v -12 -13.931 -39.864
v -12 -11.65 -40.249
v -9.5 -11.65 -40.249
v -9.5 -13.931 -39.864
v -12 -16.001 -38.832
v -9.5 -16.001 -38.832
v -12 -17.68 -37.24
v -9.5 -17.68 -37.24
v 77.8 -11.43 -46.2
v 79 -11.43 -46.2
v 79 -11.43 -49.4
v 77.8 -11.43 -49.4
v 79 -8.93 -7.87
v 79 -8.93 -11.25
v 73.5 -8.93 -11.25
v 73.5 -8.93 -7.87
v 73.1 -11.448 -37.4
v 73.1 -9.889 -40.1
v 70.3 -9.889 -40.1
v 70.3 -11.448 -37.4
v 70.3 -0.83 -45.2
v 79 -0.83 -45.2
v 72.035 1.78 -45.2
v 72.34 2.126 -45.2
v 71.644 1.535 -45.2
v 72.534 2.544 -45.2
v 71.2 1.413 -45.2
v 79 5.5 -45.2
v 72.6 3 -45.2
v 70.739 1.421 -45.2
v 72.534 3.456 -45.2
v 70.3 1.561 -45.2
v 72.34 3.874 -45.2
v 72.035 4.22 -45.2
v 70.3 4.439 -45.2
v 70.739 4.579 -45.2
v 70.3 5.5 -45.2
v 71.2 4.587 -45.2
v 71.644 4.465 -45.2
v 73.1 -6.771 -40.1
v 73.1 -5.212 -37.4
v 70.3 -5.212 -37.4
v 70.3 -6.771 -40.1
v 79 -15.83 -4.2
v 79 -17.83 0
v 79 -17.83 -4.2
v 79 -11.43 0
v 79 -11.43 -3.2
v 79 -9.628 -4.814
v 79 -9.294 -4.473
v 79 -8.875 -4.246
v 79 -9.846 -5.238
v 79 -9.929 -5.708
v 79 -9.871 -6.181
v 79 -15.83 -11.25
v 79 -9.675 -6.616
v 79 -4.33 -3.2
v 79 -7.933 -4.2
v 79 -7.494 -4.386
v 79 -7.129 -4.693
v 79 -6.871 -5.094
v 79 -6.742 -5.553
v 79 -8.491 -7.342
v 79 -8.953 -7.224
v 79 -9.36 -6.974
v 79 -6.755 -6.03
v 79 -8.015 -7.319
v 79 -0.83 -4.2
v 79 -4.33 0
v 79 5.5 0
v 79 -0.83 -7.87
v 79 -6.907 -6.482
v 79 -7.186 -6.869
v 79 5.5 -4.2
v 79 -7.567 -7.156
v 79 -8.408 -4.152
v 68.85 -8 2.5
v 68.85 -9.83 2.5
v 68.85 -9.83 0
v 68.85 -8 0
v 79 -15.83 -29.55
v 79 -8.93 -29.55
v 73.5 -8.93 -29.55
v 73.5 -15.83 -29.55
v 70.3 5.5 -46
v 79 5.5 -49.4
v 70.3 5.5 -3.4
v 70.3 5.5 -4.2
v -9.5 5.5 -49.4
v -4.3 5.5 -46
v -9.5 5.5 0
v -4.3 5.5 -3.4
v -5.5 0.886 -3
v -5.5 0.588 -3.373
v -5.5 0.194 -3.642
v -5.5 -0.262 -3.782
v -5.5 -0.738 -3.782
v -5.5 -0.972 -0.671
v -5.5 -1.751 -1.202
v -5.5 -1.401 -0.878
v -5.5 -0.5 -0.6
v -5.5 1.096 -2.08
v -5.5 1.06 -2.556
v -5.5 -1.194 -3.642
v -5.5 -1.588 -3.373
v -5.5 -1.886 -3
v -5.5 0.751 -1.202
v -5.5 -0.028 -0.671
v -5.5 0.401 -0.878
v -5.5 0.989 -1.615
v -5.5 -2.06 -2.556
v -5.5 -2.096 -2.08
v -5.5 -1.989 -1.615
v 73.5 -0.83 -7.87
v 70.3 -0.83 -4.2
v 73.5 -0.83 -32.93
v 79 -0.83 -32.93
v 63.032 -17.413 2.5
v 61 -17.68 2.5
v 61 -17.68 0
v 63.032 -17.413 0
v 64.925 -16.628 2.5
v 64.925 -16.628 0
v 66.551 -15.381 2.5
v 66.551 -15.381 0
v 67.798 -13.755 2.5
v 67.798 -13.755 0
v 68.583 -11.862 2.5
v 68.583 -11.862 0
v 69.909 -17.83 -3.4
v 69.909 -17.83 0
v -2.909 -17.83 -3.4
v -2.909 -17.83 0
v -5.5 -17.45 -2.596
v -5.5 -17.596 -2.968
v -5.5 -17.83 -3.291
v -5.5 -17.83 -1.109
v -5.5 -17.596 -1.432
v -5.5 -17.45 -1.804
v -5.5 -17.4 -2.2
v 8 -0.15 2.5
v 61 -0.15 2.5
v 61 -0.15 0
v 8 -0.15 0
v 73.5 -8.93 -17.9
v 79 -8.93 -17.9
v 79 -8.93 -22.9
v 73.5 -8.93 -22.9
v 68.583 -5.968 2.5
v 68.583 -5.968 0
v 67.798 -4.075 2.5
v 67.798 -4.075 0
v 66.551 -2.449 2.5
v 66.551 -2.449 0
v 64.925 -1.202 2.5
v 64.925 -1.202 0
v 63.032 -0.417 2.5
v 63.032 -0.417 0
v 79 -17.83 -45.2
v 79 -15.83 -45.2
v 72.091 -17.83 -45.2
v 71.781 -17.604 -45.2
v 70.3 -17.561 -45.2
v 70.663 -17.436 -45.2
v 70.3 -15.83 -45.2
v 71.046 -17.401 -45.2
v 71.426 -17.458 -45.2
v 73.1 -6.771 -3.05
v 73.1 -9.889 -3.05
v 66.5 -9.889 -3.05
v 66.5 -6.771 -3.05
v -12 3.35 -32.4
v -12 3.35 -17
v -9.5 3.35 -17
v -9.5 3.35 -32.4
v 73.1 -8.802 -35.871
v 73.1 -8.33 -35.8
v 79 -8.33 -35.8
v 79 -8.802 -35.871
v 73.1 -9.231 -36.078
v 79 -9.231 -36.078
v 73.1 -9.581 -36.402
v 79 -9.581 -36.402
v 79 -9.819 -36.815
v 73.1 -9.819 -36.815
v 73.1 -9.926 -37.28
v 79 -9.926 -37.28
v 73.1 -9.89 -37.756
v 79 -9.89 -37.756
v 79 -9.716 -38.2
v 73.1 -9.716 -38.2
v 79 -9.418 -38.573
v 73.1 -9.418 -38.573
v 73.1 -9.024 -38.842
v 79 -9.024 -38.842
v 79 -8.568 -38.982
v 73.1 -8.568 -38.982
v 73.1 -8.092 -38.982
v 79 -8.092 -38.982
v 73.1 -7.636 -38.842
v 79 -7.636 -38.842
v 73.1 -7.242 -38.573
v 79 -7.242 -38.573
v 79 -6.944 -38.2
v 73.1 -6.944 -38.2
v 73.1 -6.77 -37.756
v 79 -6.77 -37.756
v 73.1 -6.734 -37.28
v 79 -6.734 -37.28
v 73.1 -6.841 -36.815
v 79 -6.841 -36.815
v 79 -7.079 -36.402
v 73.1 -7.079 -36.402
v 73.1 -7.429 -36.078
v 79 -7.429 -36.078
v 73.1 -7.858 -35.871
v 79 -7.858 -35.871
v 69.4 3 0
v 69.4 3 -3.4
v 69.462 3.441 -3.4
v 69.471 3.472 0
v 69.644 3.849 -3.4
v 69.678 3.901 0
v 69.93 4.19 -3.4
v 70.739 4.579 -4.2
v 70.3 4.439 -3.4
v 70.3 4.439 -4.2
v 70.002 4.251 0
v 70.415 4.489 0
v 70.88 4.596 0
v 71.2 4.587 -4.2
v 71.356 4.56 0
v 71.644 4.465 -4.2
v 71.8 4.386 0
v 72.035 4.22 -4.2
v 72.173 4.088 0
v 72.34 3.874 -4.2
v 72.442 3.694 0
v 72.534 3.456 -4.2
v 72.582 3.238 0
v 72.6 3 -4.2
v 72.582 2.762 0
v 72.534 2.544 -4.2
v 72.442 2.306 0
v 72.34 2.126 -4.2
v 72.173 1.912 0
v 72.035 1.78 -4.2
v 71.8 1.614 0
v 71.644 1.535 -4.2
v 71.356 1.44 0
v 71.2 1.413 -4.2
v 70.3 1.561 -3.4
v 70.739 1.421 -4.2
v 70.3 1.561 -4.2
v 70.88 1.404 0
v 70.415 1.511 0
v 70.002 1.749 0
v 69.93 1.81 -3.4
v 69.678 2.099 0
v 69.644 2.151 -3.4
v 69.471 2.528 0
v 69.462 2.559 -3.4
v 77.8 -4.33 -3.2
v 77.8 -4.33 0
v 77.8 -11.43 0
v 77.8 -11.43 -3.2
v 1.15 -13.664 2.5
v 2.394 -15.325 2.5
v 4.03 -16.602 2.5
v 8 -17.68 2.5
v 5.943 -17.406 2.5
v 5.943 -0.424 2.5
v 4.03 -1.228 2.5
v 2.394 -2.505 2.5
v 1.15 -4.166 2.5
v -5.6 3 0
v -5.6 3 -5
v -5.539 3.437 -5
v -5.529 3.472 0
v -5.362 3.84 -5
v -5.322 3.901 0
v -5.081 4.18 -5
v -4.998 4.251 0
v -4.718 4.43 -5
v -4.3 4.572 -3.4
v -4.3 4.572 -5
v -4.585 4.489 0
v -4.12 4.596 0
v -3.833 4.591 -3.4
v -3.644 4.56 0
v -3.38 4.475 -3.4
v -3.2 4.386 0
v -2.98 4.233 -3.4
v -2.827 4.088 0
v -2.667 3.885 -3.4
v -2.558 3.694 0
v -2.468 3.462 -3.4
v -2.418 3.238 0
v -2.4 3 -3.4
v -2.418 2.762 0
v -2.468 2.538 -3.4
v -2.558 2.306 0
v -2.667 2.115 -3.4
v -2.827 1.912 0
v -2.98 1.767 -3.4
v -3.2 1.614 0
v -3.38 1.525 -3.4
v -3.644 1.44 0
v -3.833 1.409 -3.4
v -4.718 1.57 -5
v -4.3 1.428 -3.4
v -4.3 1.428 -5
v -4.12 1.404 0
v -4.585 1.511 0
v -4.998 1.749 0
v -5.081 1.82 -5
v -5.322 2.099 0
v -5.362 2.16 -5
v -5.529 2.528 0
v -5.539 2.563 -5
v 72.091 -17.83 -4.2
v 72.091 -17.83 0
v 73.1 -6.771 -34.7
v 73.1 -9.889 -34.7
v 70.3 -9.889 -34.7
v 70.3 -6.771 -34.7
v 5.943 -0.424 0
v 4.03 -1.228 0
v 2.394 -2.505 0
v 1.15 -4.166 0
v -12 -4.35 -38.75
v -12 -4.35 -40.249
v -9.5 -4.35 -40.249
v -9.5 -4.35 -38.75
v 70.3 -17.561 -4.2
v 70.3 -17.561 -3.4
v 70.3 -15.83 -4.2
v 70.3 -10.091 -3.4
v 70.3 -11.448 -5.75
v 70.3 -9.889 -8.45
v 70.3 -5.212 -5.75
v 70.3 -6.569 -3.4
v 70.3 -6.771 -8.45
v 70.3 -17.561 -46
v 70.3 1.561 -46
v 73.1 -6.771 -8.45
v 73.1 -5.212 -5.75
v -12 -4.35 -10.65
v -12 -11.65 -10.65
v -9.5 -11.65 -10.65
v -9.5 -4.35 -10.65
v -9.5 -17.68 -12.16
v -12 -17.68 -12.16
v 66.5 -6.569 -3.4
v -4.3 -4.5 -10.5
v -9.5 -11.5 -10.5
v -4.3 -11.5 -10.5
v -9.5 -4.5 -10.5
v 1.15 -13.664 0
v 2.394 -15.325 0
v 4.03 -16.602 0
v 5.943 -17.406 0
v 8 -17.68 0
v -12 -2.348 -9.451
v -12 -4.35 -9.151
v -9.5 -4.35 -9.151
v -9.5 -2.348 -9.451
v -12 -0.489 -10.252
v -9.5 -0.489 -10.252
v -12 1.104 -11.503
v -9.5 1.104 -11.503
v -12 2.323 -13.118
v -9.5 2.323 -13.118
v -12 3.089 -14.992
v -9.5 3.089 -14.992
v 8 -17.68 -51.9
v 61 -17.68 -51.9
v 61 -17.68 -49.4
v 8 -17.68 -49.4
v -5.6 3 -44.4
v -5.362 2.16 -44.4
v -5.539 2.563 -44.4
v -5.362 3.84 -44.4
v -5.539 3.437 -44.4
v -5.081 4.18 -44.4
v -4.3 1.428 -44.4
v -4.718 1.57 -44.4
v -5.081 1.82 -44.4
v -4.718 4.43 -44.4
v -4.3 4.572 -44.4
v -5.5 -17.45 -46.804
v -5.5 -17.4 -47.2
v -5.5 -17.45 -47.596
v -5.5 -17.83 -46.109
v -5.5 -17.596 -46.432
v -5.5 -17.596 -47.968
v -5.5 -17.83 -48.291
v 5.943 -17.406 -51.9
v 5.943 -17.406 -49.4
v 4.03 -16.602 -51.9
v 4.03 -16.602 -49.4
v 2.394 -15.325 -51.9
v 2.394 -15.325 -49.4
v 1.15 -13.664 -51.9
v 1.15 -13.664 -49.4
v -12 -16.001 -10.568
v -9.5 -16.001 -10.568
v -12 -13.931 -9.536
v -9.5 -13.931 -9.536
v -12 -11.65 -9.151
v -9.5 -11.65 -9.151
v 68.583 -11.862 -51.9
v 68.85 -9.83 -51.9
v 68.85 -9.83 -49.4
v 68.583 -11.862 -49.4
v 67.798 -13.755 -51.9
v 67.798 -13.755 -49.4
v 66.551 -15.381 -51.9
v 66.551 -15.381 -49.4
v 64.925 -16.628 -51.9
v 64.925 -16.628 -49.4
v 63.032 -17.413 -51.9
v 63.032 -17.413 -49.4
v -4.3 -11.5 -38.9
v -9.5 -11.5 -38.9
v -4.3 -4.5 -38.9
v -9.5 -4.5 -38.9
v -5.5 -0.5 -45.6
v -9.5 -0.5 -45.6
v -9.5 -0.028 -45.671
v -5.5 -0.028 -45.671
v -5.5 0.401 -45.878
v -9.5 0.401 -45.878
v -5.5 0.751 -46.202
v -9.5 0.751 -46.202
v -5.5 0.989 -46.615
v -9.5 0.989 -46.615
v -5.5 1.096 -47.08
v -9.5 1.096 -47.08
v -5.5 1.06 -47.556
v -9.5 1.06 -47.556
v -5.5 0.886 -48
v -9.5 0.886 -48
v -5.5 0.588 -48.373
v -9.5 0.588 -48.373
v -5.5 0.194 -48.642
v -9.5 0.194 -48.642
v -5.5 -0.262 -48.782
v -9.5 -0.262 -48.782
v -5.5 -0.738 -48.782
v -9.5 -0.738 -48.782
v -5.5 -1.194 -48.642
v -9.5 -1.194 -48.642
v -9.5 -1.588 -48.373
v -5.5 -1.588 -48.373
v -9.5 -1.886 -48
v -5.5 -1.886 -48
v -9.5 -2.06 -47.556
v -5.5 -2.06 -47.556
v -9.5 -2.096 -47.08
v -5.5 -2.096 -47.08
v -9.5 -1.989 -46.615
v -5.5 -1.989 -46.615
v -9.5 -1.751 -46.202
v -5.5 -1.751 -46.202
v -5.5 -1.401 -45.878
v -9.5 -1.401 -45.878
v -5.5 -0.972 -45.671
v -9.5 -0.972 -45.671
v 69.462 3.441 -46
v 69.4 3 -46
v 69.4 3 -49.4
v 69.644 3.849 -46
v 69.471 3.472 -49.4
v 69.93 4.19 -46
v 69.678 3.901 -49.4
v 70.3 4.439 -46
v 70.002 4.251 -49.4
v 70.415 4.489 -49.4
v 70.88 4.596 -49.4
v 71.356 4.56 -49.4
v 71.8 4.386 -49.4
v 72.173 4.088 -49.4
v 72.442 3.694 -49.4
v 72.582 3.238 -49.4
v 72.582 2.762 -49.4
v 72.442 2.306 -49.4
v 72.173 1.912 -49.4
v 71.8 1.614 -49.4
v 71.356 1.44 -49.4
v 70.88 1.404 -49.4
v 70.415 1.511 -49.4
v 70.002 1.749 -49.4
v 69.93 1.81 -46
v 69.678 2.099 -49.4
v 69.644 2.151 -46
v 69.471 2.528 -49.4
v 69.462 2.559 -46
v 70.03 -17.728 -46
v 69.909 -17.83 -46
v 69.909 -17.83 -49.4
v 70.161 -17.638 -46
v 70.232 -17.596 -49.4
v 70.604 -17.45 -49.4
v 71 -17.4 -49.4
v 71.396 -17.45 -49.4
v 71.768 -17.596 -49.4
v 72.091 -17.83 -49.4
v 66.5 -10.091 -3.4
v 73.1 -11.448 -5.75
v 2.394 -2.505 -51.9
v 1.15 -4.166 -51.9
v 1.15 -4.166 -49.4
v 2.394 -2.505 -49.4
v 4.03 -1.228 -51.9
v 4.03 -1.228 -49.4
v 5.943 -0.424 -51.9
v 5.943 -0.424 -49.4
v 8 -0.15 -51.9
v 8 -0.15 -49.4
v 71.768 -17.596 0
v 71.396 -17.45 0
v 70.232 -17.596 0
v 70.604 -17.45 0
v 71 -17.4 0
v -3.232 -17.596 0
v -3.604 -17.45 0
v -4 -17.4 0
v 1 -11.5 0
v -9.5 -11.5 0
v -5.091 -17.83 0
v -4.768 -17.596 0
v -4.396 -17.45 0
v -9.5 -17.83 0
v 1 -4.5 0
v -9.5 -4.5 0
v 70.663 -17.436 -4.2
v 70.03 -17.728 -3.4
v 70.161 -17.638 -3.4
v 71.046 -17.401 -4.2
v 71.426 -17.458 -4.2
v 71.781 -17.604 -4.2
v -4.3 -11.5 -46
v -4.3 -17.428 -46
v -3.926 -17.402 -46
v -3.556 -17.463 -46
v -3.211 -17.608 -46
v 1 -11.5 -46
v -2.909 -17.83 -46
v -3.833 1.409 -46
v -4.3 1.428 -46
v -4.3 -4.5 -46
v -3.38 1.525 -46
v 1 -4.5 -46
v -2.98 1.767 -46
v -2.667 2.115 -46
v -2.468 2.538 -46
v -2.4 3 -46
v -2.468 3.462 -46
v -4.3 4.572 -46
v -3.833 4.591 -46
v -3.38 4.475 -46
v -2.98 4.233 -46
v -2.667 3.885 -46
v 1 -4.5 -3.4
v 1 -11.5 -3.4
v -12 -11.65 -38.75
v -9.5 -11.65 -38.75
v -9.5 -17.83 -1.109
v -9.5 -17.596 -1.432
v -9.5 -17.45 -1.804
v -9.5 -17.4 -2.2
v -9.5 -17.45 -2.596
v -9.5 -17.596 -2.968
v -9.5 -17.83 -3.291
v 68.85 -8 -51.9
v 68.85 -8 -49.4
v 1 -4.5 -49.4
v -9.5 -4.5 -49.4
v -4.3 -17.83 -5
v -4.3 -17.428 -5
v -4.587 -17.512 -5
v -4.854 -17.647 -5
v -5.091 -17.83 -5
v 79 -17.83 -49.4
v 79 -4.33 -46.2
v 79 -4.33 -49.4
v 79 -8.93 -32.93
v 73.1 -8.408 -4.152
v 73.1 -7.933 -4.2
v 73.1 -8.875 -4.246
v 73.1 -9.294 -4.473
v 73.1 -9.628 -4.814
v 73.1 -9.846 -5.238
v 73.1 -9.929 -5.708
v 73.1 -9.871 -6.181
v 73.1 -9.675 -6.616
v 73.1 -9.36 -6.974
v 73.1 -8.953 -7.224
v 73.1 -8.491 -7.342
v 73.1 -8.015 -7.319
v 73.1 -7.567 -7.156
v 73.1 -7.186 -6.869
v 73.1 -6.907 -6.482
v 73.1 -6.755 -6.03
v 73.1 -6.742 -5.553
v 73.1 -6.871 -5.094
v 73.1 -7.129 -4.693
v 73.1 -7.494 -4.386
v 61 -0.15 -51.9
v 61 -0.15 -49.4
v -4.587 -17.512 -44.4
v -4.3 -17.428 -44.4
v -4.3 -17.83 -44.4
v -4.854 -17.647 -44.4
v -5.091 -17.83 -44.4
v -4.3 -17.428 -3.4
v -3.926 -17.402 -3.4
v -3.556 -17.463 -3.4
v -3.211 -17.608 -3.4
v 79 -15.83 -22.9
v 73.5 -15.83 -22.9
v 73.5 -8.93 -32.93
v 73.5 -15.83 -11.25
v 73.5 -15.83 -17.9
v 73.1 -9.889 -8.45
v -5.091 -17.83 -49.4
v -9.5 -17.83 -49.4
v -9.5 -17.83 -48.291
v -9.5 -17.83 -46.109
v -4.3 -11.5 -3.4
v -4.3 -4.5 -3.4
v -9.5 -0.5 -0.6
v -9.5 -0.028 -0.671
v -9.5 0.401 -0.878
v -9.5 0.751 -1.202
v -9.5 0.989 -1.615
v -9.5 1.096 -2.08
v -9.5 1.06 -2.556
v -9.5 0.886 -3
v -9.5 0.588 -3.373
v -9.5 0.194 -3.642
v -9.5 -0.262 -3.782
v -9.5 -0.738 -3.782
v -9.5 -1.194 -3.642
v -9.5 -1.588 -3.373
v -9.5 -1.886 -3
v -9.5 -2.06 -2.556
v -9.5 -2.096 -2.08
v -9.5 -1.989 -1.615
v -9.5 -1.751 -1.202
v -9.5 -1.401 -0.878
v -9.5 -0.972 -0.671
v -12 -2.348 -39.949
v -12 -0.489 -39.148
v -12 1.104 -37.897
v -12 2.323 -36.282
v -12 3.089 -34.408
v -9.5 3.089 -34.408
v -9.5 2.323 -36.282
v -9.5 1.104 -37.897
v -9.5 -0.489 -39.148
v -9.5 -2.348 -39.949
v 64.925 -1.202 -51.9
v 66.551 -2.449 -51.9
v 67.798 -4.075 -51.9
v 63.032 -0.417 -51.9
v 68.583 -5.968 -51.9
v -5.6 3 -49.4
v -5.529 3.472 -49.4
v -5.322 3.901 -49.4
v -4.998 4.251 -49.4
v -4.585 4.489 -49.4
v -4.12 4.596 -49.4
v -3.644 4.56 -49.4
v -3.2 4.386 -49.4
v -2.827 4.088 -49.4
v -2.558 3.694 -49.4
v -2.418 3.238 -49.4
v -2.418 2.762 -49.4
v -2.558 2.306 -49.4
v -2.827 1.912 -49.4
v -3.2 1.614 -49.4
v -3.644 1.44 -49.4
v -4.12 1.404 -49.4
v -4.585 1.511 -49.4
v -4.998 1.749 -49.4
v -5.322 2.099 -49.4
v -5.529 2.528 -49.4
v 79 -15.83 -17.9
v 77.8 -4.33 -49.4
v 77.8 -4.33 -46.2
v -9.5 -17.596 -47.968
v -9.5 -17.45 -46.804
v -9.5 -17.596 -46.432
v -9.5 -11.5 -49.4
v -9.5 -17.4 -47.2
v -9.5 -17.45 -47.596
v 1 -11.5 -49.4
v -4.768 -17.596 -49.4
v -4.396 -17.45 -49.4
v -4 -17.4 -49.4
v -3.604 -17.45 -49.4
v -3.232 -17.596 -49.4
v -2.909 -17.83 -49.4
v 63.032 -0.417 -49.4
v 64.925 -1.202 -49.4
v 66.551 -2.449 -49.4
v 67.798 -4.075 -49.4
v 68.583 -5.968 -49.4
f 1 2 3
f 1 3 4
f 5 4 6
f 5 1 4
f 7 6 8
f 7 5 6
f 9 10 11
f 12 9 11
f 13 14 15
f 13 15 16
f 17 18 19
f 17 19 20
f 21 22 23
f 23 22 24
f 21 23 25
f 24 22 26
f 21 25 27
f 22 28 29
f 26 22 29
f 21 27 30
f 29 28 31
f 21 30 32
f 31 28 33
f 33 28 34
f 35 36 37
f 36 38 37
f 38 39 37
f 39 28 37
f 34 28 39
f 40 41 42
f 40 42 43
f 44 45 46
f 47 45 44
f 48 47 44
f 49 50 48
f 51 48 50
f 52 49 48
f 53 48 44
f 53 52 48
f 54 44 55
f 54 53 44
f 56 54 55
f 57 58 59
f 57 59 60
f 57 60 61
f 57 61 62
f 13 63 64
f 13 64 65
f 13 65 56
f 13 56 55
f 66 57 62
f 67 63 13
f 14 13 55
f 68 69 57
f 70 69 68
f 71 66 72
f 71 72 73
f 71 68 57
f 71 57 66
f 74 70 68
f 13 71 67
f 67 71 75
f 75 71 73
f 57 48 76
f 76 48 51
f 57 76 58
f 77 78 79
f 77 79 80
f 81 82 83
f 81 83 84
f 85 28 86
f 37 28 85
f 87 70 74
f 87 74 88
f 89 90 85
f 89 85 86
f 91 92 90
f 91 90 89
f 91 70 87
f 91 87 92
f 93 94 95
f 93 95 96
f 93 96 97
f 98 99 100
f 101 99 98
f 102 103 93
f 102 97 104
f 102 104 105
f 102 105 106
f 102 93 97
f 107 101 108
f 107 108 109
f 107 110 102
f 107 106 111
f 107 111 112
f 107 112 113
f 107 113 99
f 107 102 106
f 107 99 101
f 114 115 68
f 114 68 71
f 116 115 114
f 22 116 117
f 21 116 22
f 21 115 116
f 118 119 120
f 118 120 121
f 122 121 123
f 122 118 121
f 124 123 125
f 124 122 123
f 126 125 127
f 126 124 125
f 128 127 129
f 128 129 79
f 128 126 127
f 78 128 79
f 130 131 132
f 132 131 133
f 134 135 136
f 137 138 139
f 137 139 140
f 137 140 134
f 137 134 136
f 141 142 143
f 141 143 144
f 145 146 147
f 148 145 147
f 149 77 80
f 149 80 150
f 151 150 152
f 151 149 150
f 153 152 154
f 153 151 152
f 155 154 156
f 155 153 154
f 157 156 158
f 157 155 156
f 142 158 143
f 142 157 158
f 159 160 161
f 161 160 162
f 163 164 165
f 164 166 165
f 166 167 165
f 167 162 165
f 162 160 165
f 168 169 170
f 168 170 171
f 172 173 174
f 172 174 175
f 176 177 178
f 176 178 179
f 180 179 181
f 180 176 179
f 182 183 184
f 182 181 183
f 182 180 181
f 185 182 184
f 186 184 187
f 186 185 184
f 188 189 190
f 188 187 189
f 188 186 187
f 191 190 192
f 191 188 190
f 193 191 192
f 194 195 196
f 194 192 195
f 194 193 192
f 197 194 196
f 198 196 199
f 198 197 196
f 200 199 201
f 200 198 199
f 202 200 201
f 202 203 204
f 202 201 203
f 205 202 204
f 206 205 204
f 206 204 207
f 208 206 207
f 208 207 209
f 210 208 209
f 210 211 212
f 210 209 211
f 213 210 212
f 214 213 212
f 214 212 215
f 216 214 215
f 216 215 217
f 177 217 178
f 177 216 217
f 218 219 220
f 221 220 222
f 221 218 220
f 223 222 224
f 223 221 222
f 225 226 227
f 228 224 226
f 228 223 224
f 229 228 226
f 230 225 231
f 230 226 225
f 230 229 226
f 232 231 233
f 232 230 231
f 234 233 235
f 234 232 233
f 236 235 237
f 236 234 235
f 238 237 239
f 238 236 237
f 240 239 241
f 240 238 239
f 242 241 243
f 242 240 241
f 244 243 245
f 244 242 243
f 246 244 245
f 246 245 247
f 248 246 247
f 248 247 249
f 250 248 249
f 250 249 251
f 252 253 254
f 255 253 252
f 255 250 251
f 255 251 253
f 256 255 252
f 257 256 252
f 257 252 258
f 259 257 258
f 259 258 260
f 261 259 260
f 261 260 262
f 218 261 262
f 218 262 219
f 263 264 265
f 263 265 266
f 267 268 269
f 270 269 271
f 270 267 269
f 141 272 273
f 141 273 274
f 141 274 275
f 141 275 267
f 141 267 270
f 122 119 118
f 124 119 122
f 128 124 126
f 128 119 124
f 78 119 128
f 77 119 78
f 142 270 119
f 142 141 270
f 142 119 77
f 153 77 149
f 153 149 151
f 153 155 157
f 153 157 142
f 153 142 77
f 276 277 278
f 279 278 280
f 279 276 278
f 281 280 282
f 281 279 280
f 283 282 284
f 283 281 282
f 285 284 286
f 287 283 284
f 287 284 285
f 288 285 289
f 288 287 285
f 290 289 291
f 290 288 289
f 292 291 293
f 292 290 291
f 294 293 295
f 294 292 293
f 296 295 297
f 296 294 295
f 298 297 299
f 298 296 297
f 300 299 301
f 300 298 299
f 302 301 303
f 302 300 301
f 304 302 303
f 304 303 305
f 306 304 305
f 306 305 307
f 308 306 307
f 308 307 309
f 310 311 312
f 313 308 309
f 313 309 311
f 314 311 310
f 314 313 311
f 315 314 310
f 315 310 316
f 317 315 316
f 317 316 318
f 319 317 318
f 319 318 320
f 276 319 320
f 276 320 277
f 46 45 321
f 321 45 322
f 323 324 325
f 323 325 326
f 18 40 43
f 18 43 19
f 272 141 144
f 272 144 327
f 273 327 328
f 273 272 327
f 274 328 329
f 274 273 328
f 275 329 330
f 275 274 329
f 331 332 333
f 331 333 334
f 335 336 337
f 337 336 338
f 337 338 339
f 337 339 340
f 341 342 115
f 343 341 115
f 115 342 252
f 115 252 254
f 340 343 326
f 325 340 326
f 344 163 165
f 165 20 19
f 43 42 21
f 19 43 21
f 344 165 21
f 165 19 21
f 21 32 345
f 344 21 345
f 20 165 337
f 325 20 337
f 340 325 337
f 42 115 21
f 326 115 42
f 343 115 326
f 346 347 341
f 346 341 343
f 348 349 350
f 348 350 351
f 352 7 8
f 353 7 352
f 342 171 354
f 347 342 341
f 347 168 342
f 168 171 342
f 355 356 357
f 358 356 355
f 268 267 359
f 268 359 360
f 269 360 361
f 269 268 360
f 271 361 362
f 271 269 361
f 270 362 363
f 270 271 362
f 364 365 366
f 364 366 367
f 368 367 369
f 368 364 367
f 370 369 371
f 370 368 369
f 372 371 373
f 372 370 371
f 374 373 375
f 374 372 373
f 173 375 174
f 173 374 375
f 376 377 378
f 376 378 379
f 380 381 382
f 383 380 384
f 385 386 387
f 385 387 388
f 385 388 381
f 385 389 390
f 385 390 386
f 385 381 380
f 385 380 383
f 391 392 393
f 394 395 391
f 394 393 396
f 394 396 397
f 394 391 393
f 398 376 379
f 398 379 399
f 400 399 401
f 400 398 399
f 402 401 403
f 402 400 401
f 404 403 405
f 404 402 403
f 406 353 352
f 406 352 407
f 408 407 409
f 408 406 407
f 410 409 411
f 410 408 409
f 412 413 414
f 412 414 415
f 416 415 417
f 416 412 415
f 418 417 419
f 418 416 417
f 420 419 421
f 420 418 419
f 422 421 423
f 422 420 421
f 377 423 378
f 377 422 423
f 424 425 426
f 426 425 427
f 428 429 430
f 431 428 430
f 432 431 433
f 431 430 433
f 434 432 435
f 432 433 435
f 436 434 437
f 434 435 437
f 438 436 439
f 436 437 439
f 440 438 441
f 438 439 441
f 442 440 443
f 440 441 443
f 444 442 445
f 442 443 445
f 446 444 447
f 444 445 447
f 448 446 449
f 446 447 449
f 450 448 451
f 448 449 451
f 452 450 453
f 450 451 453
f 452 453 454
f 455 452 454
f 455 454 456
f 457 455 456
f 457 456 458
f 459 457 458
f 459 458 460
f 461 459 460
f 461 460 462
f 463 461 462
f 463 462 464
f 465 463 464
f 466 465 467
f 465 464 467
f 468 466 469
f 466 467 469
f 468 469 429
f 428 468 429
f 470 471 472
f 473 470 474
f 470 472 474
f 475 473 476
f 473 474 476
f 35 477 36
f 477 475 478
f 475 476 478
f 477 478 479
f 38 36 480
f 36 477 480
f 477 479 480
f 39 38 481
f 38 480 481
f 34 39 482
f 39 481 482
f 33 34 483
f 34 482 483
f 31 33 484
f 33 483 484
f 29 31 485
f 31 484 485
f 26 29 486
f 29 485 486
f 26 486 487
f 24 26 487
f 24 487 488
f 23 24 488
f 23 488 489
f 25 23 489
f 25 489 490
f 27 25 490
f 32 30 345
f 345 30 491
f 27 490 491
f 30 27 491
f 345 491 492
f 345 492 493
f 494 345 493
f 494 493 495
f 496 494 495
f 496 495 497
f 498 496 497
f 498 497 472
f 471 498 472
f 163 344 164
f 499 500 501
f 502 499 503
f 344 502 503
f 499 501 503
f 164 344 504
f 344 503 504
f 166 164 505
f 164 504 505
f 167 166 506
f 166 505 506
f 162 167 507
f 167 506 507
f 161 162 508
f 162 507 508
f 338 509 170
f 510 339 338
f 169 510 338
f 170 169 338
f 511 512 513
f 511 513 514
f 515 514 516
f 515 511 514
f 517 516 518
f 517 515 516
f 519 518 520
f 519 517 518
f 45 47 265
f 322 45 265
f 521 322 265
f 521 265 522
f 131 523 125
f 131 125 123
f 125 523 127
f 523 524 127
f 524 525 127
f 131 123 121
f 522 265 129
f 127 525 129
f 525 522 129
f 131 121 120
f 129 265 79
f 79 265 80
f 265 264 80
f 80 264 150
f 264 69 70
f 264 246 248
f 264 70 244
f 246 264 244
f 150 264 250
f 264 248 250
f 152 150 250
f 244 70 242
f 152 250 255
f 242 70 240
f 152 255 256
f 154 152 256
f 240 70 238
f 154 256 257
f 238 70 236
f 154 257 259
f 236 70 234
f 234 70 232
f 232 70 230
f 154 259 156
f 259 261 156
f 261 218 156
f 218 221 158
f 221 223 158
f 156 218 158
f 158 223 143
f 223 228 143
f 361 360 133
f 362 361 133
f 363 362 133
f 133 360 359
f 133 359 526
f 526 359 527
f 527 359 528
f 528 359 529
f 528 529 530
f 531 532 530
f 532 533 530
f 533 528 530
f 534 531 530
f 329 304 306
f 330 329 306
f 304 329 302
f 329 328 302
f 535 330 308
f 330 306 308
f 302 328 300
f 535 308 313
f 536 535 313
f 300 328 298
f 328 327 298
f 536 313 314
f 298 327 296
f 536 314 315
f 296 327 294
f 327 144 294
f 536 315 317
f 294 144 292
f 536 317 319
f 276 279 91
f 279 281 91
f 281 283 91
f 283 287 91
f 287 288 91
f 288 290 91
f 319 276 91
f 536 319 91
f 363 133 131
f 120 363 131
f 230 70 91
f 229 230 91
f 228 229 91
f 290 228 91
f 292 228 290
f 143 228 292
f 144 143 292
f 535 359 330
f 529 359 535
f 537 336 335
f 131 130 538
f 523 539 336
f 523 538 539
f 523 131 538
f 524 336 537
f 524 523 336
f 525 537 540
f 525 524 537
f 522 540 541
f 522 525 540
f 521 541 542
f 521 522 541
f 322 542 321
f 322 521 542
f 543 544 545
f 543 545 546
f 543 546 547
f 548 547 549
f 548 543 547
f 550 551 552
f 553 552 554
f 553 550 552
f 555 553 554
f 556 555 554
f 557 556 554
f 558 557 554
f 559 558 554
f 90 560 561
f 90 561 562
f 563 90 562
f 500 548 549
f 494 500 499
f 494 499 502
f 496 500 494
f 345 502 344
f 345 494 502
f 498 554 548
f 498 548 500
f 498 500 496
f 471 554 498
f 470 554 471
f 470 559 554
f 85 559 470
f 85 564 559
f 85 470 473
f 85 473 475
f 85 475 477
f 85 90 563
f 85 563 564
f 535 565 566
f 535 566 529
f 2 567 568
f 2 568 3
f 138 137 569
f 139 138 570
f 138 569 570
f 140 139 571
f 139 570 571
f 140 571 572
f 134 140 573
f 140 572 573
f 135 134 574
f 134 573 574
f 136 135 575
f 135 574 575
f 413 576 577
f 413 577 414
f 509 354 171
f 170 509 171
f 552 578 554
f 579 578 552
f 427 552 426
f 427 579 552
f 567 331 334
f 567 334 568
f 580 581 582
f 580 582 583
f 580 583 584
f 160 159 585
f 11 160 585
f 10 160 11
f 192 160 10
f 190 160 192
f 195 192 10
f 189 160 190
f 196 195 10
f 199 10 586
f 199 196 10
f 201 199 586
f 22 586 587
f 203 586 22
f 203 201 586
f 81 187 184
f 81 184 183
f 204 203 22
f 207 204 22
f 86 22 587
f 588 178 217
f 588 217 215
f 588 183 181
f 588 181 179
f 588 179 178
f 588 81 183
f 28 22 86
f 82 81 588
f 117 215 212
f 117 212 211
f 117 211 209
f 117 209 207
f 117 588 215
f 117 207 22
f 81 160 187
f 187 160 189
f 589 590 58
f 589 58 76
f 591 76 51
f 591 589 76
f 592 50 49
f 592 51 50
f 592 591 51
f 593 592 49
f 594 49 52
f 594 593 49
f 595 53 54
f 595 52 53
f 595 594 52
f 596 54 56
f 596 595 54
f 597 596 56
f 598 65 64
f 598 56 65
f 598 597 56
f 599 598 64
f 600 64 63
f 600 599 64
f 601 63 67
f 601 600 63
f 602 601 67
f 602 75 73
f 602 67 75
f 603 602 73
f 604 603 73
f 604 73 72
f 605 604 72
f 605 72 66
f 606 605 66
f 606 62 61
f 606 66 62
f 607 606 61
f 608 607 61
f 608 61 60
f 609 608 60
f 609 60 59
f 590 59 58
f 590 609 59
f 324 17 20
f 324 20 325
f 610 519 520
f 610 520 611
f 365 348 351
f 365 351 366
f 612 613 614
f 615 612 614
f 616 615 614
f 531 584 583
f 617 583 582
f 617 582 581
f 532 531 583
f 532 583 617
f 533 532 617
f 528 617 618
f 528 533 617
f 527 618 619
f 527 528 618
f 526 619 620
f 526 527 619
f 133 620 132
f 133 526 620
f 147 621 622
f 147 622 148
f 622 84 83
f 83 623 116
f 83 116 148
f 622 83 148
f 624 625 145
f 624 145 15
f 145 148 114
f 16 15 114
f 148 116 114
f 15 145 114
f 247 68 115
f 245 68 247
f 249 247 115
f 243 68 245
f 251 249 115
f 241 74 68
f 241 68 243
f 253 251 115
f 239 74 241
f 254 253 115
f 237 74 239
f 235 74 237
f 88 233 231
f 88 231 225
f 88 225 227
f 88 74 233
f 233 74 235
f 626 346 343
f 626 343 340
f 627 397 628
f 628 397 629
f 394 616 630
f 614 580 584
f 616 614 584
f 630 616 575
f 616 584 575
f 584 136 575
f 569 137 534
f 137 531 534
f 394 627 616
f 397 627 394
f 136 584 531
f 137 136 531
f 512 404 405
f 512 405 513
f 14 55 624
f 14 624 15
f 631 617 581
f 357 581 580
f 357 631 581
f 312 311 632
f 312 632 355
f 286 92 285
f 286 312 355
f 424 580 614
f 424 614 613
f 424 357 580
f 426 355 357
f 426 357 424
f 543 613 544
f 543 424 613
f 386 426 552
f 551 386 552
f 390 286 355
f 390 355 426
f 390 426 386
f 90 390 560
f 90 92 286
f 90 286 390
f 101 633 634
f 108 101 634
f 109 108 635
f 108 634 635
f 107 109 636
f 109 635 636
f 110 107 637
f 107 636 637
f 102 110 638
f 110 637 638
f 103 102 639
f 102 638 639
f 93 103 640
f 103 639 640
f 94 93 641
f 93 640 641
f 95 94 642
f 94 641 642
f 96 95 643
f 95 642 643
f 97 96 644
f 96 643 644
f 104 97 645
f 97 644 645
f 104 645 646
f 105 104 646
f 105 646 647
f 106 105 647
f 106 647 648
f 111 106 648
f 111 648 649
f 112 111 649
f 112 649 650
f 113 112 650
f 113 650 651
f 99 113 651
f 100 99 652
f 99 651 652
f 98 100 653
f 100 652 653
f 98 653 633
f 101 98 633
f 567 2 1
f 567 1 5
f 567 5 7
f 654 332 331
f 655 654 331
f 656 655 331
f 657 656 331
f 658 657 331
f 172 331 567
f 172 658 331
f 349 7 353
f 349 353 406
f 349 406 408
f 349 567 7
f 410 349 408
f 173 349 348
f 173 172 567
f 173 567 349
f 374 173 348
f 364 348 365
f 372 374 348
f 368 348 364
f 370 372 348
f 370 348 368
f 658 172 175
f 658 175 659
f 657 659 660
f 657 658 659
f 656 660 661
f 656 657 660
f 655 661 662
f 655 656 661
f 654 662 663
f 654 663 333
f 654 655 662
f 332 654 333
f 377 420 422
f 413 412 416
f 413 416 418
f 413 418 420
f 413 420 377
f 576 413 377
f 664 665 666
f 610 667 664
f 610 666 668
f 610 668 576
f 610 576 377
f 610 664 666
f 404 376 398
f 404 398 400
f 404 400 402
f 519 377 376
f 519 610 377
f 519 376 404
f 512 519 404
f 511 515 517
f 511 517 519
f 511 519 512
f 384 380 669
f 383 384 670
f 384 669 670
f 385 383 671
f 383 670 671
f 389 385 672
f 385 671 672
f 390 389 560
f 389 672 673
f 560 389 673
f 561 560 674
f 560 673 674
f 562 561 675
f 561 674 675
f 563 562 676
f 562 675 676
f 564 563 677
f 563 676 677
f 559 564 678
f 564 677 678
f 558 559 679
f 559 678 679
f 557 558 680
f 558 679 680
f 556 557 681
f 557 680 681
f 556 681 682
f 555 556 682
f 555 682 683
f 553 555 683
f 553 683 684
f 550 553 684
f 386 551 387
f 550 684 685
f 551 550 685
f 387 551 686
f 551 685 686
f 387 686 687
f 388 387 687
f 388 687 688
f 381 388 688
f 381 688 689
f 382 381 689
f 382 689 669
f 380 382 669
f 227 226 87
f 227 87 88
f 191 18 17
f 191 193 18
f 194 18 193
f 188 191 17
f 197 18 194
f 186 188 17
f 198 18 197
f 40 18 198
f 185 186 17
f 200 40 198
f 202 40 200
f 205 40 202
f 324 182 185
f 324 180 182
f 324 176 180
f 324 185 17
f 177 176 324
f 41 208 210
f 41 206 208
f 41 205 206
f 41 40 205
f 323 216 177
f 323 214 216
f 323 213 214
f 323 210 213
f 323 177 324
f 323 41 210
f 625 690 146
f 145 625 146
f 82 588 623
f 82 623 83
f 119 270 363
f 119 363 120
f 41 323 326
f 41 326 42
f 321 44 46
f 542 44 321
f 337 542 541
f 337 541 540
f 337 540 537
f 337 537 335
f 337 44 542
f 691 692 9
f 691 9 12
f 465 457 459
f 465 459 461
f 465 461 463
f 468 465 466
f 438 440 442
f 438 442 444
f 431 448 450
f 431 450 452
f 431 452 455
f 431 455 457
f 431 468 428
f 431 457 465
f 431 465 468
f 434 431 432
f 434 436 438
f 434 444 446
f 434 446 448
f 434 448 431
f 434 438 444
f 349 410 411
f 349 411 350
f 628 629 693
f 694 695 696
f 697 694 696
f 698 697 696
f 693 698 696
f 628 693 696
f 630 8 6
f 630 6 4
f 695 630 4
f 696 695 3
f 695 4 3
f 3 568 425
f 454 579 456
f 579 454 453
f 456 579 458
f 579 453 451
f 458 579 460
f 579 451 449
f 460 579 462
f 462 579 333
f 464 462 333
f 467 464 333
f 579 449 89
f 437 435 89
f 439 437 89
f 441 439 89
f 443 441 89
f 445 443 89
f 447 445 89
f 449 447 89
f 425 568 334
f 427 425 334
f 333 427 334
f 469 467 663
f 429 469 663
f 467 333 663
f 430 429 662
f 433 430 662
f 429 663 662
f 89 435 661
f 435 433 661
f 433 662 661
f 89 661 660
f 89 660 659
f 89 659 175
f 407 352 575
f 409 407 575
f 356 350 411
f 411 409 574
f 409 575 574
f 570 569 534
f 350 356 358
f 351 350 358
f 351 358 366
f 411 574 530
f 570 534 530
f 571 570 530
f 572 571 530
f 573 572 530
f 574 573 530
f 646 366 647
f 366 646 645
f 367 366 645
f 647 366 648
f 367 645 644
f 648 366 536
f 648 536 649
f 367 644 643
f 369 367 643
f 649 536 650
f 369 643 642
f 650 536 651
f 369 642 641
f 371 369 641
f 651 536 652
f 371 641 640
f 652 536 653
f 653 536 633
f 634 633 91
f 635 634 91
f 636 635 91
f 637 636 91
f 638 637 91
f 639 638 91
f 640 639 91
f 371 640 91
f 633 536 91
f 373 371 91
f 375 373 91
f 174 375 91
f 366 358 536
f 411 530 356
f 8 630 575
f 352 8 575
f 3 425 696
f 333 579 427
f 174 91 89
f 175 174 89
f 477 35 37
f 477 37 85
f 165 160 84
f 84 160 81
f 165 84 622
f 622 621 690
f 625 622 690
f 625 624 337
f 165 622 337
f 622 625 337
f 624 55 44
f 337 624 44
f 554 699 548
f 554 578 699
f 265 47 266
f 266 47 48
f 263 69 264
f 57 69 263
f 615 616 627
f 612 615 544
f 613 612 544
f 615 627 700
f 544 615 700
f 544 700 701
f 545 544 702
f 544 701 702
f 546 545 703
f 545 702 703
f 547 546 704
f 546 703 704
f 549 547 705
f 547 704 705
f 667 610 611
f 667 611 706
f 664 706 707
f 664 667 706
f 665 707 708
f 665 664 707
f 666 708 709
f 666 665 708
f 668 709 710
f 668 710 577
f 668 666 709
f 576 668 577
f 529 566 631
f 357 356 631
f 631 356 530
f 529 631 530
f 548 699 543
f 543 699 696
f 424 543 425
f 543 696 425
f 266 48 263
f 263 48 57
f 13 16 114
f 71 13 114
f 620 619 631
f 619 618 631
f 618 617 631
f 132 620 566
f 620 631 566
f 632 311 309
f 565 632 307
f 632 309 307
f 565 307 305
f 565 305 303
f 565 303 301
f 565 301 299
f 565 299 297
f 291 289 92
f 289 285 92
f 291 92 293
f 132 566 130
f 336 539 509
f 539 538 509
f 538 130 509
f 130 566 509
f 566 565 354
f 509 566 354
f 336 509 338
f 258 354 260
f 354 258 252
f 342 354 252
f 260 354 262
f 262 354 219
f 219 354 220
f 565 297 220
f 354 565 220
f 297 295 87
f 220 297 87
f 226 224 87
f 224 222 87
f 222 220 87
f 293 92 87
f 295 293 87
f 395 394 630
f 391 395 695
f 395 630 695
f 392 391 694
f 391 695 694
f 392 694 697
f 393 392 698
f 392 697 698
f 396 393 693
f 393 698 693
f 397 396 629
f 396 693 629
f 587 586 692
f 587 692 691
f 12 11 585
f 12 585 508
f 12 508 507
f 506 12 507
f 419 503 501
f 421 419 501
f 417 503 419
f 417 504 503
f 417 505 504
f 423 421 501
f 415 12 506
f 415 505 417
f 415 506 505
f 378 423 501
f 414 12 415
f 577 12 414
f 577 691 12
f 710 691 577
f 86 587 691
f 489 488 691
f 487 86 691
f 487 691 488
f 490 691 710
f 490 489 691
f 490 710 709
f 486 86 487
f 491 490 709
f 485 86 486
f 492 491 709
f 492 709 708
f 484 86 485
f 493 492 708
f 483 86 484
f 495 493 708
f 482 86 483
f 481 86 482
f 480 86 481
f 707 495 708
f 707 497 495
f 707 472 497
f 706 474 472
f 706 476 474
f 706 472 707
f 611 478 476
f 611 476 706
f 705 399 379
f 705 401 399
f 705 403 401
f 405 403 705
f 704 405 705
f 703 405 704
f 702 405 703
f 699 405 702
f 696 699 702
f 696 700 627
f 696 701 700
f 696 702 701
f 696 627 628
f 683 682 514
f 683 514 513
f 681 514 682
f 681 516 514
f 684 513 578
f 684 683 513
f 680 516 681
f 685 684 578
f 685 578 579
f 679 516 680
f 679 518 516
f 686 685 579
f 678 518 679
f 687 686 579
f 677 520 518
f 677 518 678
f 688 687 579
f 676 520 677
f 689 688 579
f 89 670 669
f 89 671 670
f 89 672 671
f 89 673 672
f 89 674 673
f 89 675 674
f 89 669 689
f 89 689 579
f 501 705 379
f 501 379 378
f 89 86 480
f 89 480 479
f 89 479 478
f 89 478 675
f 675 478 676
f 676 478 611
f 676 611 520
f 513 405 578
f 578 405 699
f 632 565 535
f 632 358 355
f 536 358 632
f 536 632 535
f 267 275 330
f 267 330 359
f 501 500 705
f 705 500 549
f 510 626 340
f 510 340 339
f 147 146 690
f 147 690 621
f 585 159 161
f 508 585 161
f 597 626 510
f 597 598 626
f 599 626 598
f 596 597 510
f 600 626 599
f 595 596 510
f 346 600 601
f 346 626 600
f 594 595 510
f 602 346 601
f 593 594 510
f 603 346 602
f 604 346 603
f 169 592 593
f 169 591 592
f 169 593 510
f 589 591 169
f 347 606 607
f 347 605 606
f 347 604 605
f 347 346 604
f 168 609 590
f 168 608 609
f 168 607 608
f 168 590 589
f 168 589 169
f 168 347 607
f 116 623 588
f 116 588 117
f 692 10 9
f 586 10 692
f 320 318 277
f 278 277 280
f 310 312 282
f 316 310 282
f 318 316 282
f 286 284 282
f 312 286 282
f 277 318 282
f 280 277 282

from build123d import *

# Parameters (mm, degrees)
SKETCH_2_W               = 69
SKETCH_2_H               = 17.83
EXTRUDE_1_DEPTH          = 2.5
FILLET_1_R               = 8
SKETCH_3_W               = 88.5
SKETCH_3_H               = 23.33
EXTRUDE_2_DEPTH          = 4.2
SKETCH_4_W               = 41
SKETCH_4_H               = 23.33
EXTRUDE_3_DEPTH          = 6
SKETCH_5_W               = 88.5
SKETCH_5_H               = 23.33
EXTRUDE_4_DEPTH          = 4.2
EXTRUDE_5_DEPTH          = 2.5
SKETCH_7_W               = 10.5
SKETCH_7_H               = 7
CUT_EXTRUDE_1_DEPTH      = 10.5
SKETCH_9_W               = 31.4
SKETCH_9_H               = 23
EXTRUDE_6_DEPTH          = 2.5
FILLET_3_R               = 8
SKETCH_11_W              = 5
SKETCH_11_H              = 6.9
EXTRUDE_7_DEPTH          = 8.5
SKETCH_13_W              = 41
SKETCH_13_H              = 15
EXTRUDE_8_DEPTH          = 3
SKETCH_12_W              = 3.2
SKETCH_12_H              = 7.1
CUT_EXTRUDE_3_DEPTH      = 1.2
SKETCH_10_W              = 1.5
SKETCH_10_H              = 7
CUT_EXTRUDE_4_DEPTH      = 5
CUT_EXTRUDE_5_DEPTH      = 97.190014555
CUT_EXTRUDE_5_DEPTH_BACK = 97.190014555
CUT_EXTRUDE_6_DEPTH      = 97.039627238
CUT_EXTRUDE_6_DEPTH_BACK = 97.039627238
SKETCH_15_W              = 0.823752297
SKETCH_15_H              = 2.5
SKETCH_18_W              = 41
SKETCH_18_H              = 15
EXTRUDE_10_DEPTH         = 1
CUT_EXTRUDE_7_DEPTH      = 107.266264167
CUT_EXTRUDE_7_DEPTH_BACK = 9.5
SKETCH_16_R              = 1.6
CUT_EXTRUDE_8_DEPTH      = 3
CUT_EXTRUDE_8_DEPTH_BACK = 3.6
CUT_EXTRUDE_9_DEPTH      = 2.5
CUT_EXTRUDE_10_DEPTH     = 2.5
SKETCH_22_W              = 0.12
SKETCH_22_H              = 8.1
EXTRUDE_11_DEPTH         = 5.5
CUT_EXTRUDE_14_DEPTH     = 2.5
SKETCH_24_W              = 74.6
SKETCH_24_H              = 42.6
SKETCH_24_W_2            = 73
SKETCH_24_H_2            = 41
CUT_EXTRUDE_15_DEPTH     = 98.359636914
SKETCH_25_R              = 1.6
CUT_EXTRUDE_17_DEPTH     = 5
SKETCH_26_R              = 1.6
CUT_EXTRUDE_18_DEPTH     = 4


with BuildPart() as part:
    # 草图2 → 凸台-拉伸1 (new body)
    with BuildSketch(Plane.XY):
        with Locations((34.5, -8.915)):
            Rectangle(SKETCH_2_W, SKETCH_2_H)
    extrude(amount=EXTRUDE_1_DEPTH)

    # 圆角1
    fillet_1_edges = [part.edges().sort_by_distance(p)[0] for p in [
        (0, 0, 1.25),
        (69, 0, 1.25),
        (69, -17.83, 1.25),
        (0, -17.83, 1.25),
    ]]
    fillet(fillet_1_edges, radius=FILLET_1_R)

    # 草图3 → 凸台-拉伸2 (add)
    with BuildSketch(Plane(origin=(0, 0, 0), x_dir=(-1, 0, 0), z_dir=(0, 0, -1))):
        with Locations((-34.75, -6.165)):
            Rectangle(SKETCH_3_W, SKETCH_3_H)
    extrude(amount=EXTRUDE_2_DEPTH)

    # 草图4 → 凸台-拉伸3 (add)
    with BuildSketch(Plane.ZY.offset(9.5)):
        with Locations((-24.7, -6.165)):
            Rectangle(SKETCH_4_W, SKETCH_4_H)
    extrude(amount=-EXTRUDE_3_DEPTH)

    # 草图5 → 凸台-拉伸4 (add)
    with BuildSketch(Plane(origin=(0, 0, -45.2), x_dir=(-1, 0, 0), z_dir=(0, 0, -1))):
        with Locations((-34.75, -6.165)):
            Rectangle(SKETCH_5_W, SKETCH_5_H)
    extrude(amount=EXTRUDE_4_DEPTH)

    # 草图6 → 凸台-拉伸5 (add)
    with BuildSketch(Plane(origin=(0, 0, -49.4), x_dir=(-1, 0, 0), z_dir=(0, 0, -1))):
        with BuildLine():
            Line((-69, -8), (-69, -9.83))
            ThreePointArc((-69, -9.83), (-66.656854249, -15.486854249), (-61, -17.83))
            Line((-61, -17.83), (-8, -17.83))
            ThreePointArc((-8, -17.83), (-2.343145751, -15.486854249), (0, -9.83))
            Line((0, -9.83), (0, -8))
            ThreePointArc((0, -8), (-2.343145751, -2.343145751), (-8, 0))
            Line((-8, 0), (-61, 0))
            ThreePointArc((-61, 0), (-66.656854249, -2.343145751), (-69, -8))
        make_face()
    extrude(amount=EXTRUDE_5_DEPTH)

    # 草图7 → 切除-拉伸1 (cut)
    with BuildSketch(Plane.ZY.offset(9.5)):
        with Locations((-44.15, -8)):
            Rectangle(SKETCH_7_W, SKETCH_7_H)
        with Locations((-5.25, -8)):
            Rectangle(SKETCH_7_W, SKETCH_7_H)
    extrude(amount=-CUT_EXTRUDE_1_DEPTH, mode=Mode.SUBTRACT)

    # 草图9 → 凸台-拉伸6 (add)
    with BuildSketch(Plane.ZY.offset(9.5)):
        with Locations((-24.7, -8)):
            Rectangle(SKETCH_9_W, SKETCH_9_H)
    extrude(amount=EXTRUDE_6_DEPTH)

    # 圆角3
    # the kernel refuses this fillet: 8 mm, written as the material it takes off along each edge
    with BuildSketch(Plane(origin=(-9.5, -19.5, -9), x_dir=(0, 1, 0), z_dir=(-1, 0, 0))) as fillet_3_piece_1:
        with BuildLine():
            CenterArc((FILLET_3_R, FILLET_3_R), FILLET_3_R, 180, 90)
            Line((0, FILLET_3_R), (0, 0))
            Line((0, 0), (FILLET_3_R, 0))
        make_face()
    extrude(amount=22.5, mode=Mode.SUBTRACT)
    with BuildSketch(Plane(origin=(-9.5, 3.5, -9), x_dir=(0, -1, 0), z_dir=(-1, 0, 0)), Plane(origin=(-9.5, 3.5, -40.4), x_dir=(0, 0, 1), z_dir=(-1, 0, 0)), Plane(origin=(-9.5, -19.5, -40.4), x_dir=(0, 1, 0), z_dir=(-1, 0, 0))) as fillet_3_piece_2:
        with BuildLine():
            CenterArc((FILLET_3_R, -FILLET_3_R), FILLET_3_R, 90, 90)
            Line((0, -FILLET_3_R), (0, 0))
            Line((0, 0), (FILLET_3_R, 0))
        make_face()
    extrude(amount=22.5, mode=Mode.SUBTRACT)

    # 草图11 → 凸台-拉伸7 (add)
    with BuildSketch(Plane(origin=(79, 0, 0), x_dir=(0, 0, -1), z_dir=(1, 0, 0))):
        Polygon((49.3, -0.83), (33.05, -0.83), (33.05, -8.93), (29.55, -8.93), (29.55, -15.83), (49.3, -15.83), align=None)
        Polygon((0, -15.83), (11.25, -15.83), (11.25, -8.93), (7.75, -8.93), (7.75, -0.83), (0, -0.83), align=None)
        with Locations((20.4, -12.38)):
            Rectangle(SKETCH_11_W, SKETCH_11_H)
    extrude(amount=-EXTRUDE_7_DEPTH)


with BuildPart() as extrude_7_piece_1:
    # of the separate pieces the step leaves, piece 1, a body of its own (extrude_7_pieces)
    add(part.part.solids().sort_by_distance((79, 5.5, 0))[0])



with BuildPart() as extrude_7_piece_2:
    # of the separate pieces the step leaves, piece 2, a body of its own (extrude_7_pieces)
    add(part.part.solids().sort_by_distance((79, -15.83, -17.9))[0])


with BuildPart() as extrude_7_piece_1_1:
    add(extrude_7_piece_1.part)

    add(extrude_7_piece_2.part)  # 凸台-拉伸8 merges 凸台-拉伸7 piece 2
    # 草图13 → 凸台-拉伸8 (add)
    with BuildSketch(Plane.ZY.offset(-70.5)):
        with Locations((-24.7, -8.33)):
            Rectangle(SKETCH_13_W, SKETCH_13_H)
    extrude(amount=-EXTRUDE_8_DEPTH)

    # 草图12 → 切除-拉伸3 (cut)
    with BuildSketch(Plane(origin=(79, 0, 0), x_dir=(0, 0, -1), z_dir=(1, 0, 0))):
        with Locations((1.6, -7.88)):
            Rectangle(SKETCH_12_W, SKETCH_12_H)
        with Locations((47.8, -7.88)):
            Rectangle(SKETCH_12_W, SKETCH_12_H)
    extrude(amount=-CUT_EXTRUDE_3_DEPTH, mode=Mode.SUBTRACT)

    # 草图10 → 切除-拉伸4 (cut)
    with BuildSketch(Plane(origin=(-9.5, 0, 0), x_dir=(0, 0, -1), z_dir=(1, 0, 0))):
        with BuildLine():
            Line((37.291942355, -17.83), (12.108057645, -17.83))
            ThreePointArc((12.108057645, -17.83), (14.415430403, -19.070997292), (17, -19.5))
            Line((17, -19.5), (32.4, -19.5))
            ThreePointArc((32.4, -19.5), (34.984569597, -19.070997292), (37.291942355, -17.83))
        make_face()
        with Locations((39.65, -8)):
            Rectangle(SKETCH_10_W, SKETCH_10_H)
        with Locations((9.75, -8)):
            Rectangle(SKETCH_10_W, SKETCH_10_H)
    extrude(amount=-CUT_EXTRUDE_4_DEPTH, mode=Mode.SUBTRACT)

    # 草图14 → 切除-拉伸5 (cut, two sides: drawn at the far end of the back side and taken through both)
    with BuildSketch(Plane.XY.offset(-49.4).offset(-CUT_EXTRUDE_5_DEPTH_BACK)):
        with BuildLine():
            Line((0.176247703, -11.5), (1, -11.5))
            Line((1, -11.5), (1, -4.5))
            Line((1, -4.5), (0.806252715, -4.5))
            ThreePointArc((0.806252715, -4.5), (0.204168477, -6.204168477), (0, -8))
            Line((0, -8), (0, -9.83))
            ThreePointArc((0, -9.83), (0.04418394, -10.669637311), (0.176247703, -11.5))
        make_face()
    extrude(amount=CUT_EXTRUDE_5_DEPTH + CUT_EXTRUDE_5_DEPTH_BACK, mode=Mode.SUBTRACT)

    # 草图15 → 切除-拉伸6 (cut, two sides: drawn at the far end of the back side and taken through both)
    with BuildSketch(Plane(origin=(0, -11.5, 0), x_dir=(1, 0, 0), z_dir=(0, 1, 0)).offset(-CUT_EXTRUDE_6_DEPTH_BACK)):
        with Locations((0.588123852, 50.65)):
            Rectangle(SKETCH_15_W, SKETCH_15_H)
        with Locations((0.588123852, -1.25)):
            Rectangle(SKETCH_15_W, SKETCH_15_H)
    extrude(amount=CUT_EXTRUDE_6_DEPTH + CUT_EXTRUDE_6_DEPTH_BACK, mode=Mode.SUBTRACT)

    # 草图18 → 凸台-拉伸10 (add)
    with BuildSketch(Plane.ZY.offset(-70.5)):
        with Locations((-24.7, -8.33)):
            Rectangle(SKETCH_18_W, SKETCH_18_H)
    extrude(amount=EXTRUDE_10_DEPTH)

    # 草图16 → 切除-拉伸7 (cut, two sides: drawn at the far end of the back side and taken through both)
    with BuildSketch(Plane(origin=(79, 0, 0), x_dir=(0, 0, -1), z_dir=(1, 0, 0)).offset(-CUT_EXTRUDE_7_DEPTH_BACK)):
        with Locations(Location((37.4, -8.33, 0), (0, 0, 180))):
            Circle(SKETCH_16_R)
        with Locations(Location((5.75, -8.33, 0), (0, 0, 165.638488437))):
            Circle(SKETCH_16_R)
    extrude(amount=CUT_EXTRUDE_7_DEPTH + CUT_EXTRUDE_7_DEPTH_BACK, mode=Mode.SUBTRACT)

    # 草图19 → 切除-拉伸8 (cut, two sides: drawn at the far end of the back side and taken through both)
    with BuildSketch(Plane.ZY.offset(-69.5).offset(-CUT_EXTRUDE_8_DEPTH_BACK)):
        Polygon((-37.4, -5.212308546), (-40.1, -6.771154273), (-40.1, -9.888845727), (-37.4, -11.447691454), (-34.7, -9.888845727), (-34.7, -6.771154273), align=None)
        Polygon((-5.75, -5.212308546), (-8.45, -6.771154273), (-8.45, -9.888845727), (-5.75, -11.447691454), (-3.05, -9.888845727), (-3.05, -6.771154273), align=None)
    extrude(amount=CUT_EXTRUDE_8_DEPTH + CUT_EXTRUDE_8_DEPTH_BACK, mode=Mode.SUBTRACT)

    # 草图20 → 切除-拉伸9 (cut)
    with BuildSketch(Plane.XY.offset(2.5)):
        with BuildLine():
            Line((1, -4.127016654), (1, -13.702983346))
            ThreePointArc((1, -13.702983346), (3.936987987, -16.721439137), (8, -17.83))
            Line((8, -17.83), (61, -17.83))
            ThreePointArc((61, -17.83), (66.656854249, -15.486854249), (69, -9.83))
            Line((69, -9.83), (69, -8))
            ThreePointArc((69, -8), (66.656854249, -2.343145751), (61, 0))
            Line((61, 0), (8, 0))
            ThreePointArc((8, 0), (3.936987987, -1.108560863), (1, -4.127016654))
        make_face()
        with BuildLine():
            Line((1.15, -4.165942097), (1.15, -13.664057903))
            ThreePointArc((1.15, -13.664057903), (4.029789334, -16.601995811), (8, -17.68))
            Line((8, -17.68), (61, -17.68))
            ThreePointArc((61, -17.68), (66.550788232, -15.380788232), (68.85, -9.83))
            Line((68.85, -9.83), (68.85, -8))
            ThreePointArc((68.85, -8), (66.550788232, -2.449211768), (61, -0.15))
            Line((61, -0.15), (8, -0.15))
            ThreePointArc((8, -0.15), (4.029789334, -1.228004189), (1.15, -4.165942097))
        make_face(mode=Mode.SUBTRACT)
    extrude(amount=-CUT_EXTRUDE_9_DEPTH, mode=Mode.SUBTRACT)

    # 草图21 → 切除-拉伸10 (cut)
    with BuildSketch(Plane(origin=(0, 0, -51.9), x_dir=(-1, 0, 0), z_dir=(0, 0, -1))):
        with BuildLine():
            Line((-1, -13.702983346), (-1, -4.127016654))
            ThreePointArc((-1, -4.127016654), (-3.936987987, -1.108560863), (-8, 0))
            Line((-8, 0), (-61, 0))
            ThreePointArc((-61, 0), (-66.656854249, -2.343145751), (-69, -8))
            Line((-69, -8), (-69, -9.83))
            ThreePointArc((-69, -9.83), (-66.656854249, -15.486854249), (-61, -17.83))
            Line((-61, -17.83), (-8, -17.83))
            ThreePointArc((-8, -17.83), (-3.936987987, -16.721439137), (-1, -13.702983346))
        make_face()
        with BuildLine():
            Line((-1.15, -13.664057903), (-1.15, -4.165942097))
            ThreePointArc((-1.15, -4.165942097), (-4.029789334, -1.228004189), (-8, -0.15))
            Line((-8, -0.15), (-61, -0.15))
            ThreePointArc((-61, -0.15), (-66.550788232, -2.449211768), (-68.85, -8))
            Line((-68.85, -8), (-68.85, -9.83))
            ThreePointArc((-68.85, -9.83), (-66.550788232, -15.380788232), (-61, -17.68))
            Line((-61, -17.68), (-8, -17.68))
            ThreePointArc((-8, -17.68), (-4.029789334, -16.601995811), (-1.15, -13.664057903))
        make_face(mode=Mode.SUBTRACT)
    extrude(amount=-CUT_EXTRUDE_10_DEPTH, mode=Mode.SUBTRACT)

    # 草图22 → 凸台-拉伸11 (add)
    with BuildSketch(Plane(origin=(73.5, 0, 0), x_dir=(0, 0, -1), z_dir=(1, 0, 0))):
        with Locations((7.81, -4.88)):
            Rectangle(SKETCH_22_W, SKETCH_22_H)
        with Locations((32.99, -4.88)):
            Rectangle(SKETCH_22_W, SKETCH_22_H)
    extrude(amount=EXTRUDE_11_DEPTH)

    # 草图23 → 切除-拉伸14 (cut)
    with BuildSketch(Plane.ZY.offset(12)):
        with BuildLine():
            Line((-37.291942355, -17.83), (-12.108057645, -17.83))
            ThreePointArc((-12.108057645, -17.83), (-9.818929786, -15.025936837), (-9, -11.5))
            Line((-9, -11.5), (-10.5, -11.5))
            Line((-10.5, -11.5), (-10.5, -4.5))
            Line((-10.5, -4.5), (-9, -4.5))
            ThreePointArc((-9, -4.5), (-11.343145751, 1.156854249), (-17, 3.5))
            Line((-17, 3.5), (-32.4, 3.5))
            ThreePointArc((-32.4, 3.5), (-38.056854249, 1.156854249), (-40.4, -4.5))
            Line((-40.4, -4.5), (-38.9, -4.5))
            Line((-38.9, -4.5), (-38.9, -11.5))
            Line((-38.9, -11.5), (-40.4, -11.5))
            ThreePointArc((-40.4, -11.5), (-39.581070214, -15.025936837), (-37.291942355, -17.83))
        make_face()
        with BuildLine():
            Line((-37.240464854, -17.68), (-12.159535146, -17.68))
            ThreePointArc((-12.159535146, -17.68), (-9.975535198, -15.004196663), (-9.151433252, -11.65))
            Line((-9.151433252, -11.65), (-10.65, -11.65))
            Line((-10.65, -11.65), (-10.65, -4.35))
            Line((-10.65, -4.35), (-9.151433252, -4.35))
            ThreePointArc((-9.151433252, -4.35), (-11.502500568, 1.10357029), (-17, 3.35))
            Line((-17, 3.35), (-32.4, 3.35))
            ThreePointArc((-32.4, 3.35), (-37.897499432, 1.10357029), (-40.248566748, -4.35))
            Line((-40.248566748, -4.35), (-38.75, -4.35))
            Line((-38.75, -4.35), (-38.75, -11.65))
            Line((-38.75, -11.65), (-40.248566748, -11.65))
            ThreePointArc((-40.248566748, -11.65), (-39.424464802, -15.004196663), (-37.240464854, -17.68))
        make_face(mode=Mode.SUBTRACT)
    extrude(amount=-CUT_EXTRUDE_14_DEPTH, mode=Mode.SUBTRACT)

    # 草图24 → 切除-拉伸15 (cut, through all)
    with BuildSketch(Plane(origin=(0, 5.5, 0), x_dir=(1, 0, 0), z_dir=(0, 1, 0))):
        with Locations((33, 24.7)):
            Rectangle(SKETCH_24_W, SKETCH_24_H)
        with Locations((33, 24.7)):
            Rectangle(SKETCH_24_W_2, SKETCH_24_H_2, mode=Mode.SUBTRACT)
    extrude(amount=-CUT_EXTRUDE_15_DEPTH, mode=Mode.SUBTRACT)

    # 草图25 → 切除-拉伸17 (cut)
    with BuildSketch(Plane(origin=(0, 0, -49.4), x_dir=(-1, 0, 0), z_dir=(0, 0, -1))):
        with Locations((4, 3)):
            Circle(SKETCH_25_R)
        with Locations((4, -19)):
            Circle(SKETCH_25_R)
        with Locations((-71, 3)):
            Circle(SKETCH_25_R)
        with Locations((-71, -19)):
            Circle(SKETCH_25_R)
    cut_extrude_17 = extrude(amount=-CUT_EXTRUDE_17_DEPTH, mode=Mode.SUBTRACT)

    # 镜向1: 切除-拉伸17 across plane
    add(cut_extrude_17.mirror(Plane.XY.offset(-24.7)), mode=Mode.SUBTRACT)

    # 草图26 → 切除-拉伸18 (cut)
    with BuildSketch(Plane.ZY.offset(9.5)):
        with Locations((-47.2, -0.5)):
            Circle(SKETCH_26_R)
        with Locations((-2.2, -0.5)):
            Circle(SKETCH_26_R)
        with Locations((-2.2, -19)):
            Circle(SKETCH_26_R)
        with Locations((-47.2, -19)):
            Circle(SKETCH_26_R)
    extrude(amount=-CUT_EXTRUDE_18_DEPTH, mode=Mode.SUBTRACT)


solid = extrude_7_piece_1_1.part
